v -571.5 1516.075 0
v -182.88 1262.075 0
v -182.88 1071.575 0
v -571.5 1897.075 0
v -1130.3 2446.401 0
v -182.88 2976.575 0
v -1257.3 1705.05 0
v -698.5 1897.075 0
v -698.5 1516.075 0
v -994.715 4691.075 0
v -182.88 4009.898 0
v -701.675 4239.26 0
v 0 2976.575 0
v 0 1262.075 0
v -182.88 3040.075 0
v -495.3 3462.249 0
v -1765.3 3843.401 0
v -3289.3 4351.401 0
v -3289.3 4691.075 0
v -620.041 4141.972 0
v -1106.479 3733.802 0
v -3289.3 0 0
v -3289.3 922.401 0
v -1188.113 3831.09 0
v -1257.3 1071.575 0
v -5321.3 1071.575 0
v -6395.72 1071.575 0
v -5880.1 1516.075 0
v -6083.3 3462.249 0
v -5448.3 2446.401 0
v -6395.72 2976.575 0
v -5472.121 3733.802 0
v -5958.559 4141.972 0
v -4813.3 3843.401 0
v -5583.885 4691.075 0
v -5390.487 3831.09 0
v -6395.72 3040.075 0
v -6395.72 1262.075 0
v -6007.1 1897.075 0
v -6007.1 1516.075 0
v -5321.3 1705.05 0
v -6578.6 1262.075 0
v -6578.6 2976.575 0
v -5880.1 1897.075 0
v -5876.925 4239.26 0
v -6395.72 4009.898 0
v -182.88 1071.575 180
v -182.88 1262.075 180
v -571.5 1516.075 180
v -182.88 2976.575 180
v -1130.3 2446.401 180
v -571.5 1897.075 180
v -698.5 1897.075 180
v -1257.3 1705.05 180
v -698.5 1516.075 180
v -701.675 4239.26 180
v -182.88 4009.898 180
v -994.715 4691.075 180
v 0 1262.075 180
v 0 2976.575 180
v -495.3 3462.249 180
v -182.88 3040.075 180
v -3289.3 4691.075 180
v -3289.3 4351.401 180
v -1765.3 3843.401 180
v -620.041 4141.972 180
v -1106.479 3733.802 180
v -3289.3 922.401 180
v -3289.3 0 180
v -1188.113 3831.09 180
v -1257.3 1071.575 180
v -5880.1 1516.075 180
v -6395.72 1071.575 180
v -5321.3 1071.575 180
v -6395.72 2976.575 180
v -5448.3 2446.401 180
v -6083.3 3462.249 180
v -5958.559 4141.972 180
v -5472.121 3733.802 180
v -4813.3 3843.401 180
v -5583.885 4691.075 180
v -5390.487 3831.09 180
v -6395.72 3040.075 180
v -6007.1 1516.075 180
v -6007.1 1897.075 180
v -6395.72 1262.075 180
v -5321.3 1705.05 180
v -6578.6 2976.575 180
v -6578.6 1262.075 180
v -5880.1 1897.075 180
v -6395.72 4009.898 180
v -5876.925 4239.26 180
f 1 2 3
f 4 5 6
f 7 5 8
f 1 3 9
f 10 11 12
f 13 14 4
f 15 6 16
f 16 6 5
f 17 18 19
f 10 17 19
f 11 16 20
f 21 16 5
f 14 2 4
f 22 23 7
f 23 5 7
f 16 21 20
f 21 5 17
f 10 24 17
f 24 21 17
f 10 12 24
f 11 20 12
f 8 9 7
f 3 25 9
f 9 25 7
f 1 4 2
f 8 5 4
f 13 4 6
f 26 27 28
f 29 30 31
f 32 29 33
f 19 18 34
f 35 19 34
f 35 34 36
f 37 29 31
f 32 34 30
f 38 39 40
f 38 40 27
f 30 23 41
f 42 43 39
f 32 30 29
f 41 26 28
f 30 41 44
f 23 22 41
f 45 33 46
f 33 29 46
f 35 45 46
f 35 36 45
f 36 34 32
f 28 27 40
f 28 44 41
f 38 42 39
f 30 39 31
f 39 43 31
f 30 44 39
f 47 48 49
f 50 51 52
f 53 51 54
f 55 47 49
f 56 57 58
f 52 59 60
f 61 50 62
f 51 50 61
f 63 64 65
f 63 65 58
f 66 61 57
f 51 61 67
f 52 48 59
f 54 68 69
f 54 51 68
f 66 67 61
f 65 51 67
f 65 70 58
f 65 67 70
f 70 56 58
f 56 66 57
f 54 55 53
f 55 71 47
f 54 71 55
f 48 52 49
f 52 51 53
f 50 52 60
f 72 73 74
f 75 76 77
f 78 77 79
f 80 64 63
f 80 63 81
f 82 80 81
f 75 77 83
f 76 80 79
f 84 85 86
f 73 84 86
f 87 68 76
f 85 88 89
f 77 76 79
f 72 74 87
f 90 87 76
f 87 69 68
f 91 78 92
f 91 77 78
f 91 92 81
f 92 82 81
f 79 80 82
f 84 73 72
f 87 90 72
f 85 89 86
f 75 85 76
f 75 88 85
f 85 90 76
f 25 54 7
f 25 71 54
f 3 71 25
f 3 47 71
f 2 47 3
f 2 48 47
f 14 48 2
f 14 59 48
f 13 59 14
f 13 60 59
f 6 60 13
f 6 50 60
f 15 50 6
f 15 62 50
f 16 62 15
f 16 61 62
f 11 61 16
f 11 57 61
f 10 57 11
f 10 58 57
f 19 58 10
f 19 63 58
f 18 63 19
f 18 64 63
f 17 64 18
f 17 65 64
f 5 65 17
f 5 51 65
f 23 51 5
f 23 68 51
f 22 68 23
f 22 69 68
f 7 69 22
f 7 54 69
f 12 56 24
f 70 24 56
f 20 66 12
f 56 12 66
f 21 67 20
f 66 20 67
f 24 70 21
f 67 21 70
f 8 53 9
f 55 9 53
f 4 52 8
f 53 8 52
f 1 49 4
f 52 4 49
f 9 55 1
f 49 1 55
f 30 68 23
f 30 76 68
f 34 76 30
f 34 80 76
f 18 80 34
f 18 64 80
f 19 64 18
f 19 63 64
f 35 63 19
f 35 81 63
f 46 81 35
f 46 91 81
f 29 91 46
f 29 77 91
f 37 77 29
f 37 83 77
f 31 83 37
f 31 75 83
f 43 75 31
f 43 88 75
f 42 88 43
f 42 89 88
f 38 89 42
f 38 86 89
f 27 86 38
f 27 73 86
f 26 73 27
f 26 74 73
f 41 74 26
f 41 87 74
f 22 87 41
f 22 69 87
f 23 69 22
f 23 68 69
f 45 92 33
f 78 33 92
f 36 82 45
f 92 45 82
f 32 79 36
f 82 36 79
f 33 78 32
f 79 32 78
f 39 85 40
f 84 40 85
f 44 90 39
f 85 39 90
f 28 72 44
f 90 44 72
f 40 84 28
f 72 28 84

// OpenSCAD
// file: global_constants.scad
// unit = 0.1 mm
// 1 inch = 25.4 mm = 254 units

// Dimensions

// Sheet dimensions
sheet_x=24400;
sheet_y=12200;
sheet_z=180;

// Circular cnc routing holes
cnc_circle_r=31.750;
module routing_circle(x,y){
  translate([x,y]) linear_extrude(height=sheet_z) circle(cnc_circle_r);
}

bolt_circle_r=41.0210;
module bolt_circle(x,y){
  translate([x,y]) linear_extrude(height=sheet_z) circle(bolt_circle_r);
}

// Conversion
medievaltometric=254;
metrictomedieval=.0039370078;

// Use the metric system by default
// units="medieval";
units="metric";

// Light plate construction
light_plate_support_height=1651;//6.5"
light_plate_support_width=3662.68;//14.42

// Base construction
large_support_depth=3667.4552;//14.4388"
large_support_height=4254.5;//16.75"
small_support_depth=1460.5;
small_support_height=4254.5;
front_brace_width=5842+2*sheet_z;
base_brace_edge_depth=53;

// Cradle construction
cradle_base_full_width=5969;//23.5"
cradle_base_front_corner_depth=538.3784;//2.1196"

cradle_lift_arm_cutout_height=63.5;//.25"
// main file
// To render the DXF file from the command line:
// openscad -x back_plate.dxf -D'units="metric"' back_plate.scad

include <global_constants.scad>;

main_rectangle_x=12.95*254;
main_rectangle_y=18.4688*254;

corner_rectangle_y=14.25*254;
corner_rectangle_x=4.95*254;
corner_rectangle_rectangular_cutout_x=0.72*254;
corner_rectangle_bottom_rectangular_cutout_y=0.75*254;
corner_rectangle_top_rectangular_cutout_y=6.75*254;

top_corner_height=6.75*254;

//base shape for half of the top plate
module main_trapezium(){
  difference(){
    square([main_rectangle_x,main_rectangle_y]);
    translate([main_rectangle_x,0,0]) rotate(50) translate([-main_rectangle_x,0,0]) square([main_rectangle_x,main_rectangle_y]);
  }
}

module top_corner_cutout(){
  polygon([[0,0],[corner_rectangle_rectangular_cutout_x,0],[corner_rectangle_rectangular_cutout_x,cnc_circle_r*2],[1.95*254,1.9121*254],[corner_rectangle_rectangular_cutout_x,4.0682*254],[3.9162*254,top_corner_height],[0,top_corner_height],[0,0]]);
}

//rectangular overlay on the outside of the trapezium
module corner_rectangle(){
  difference() {
    square([corner_rectangle_x,corner_rectangle_y]);
    square([corner_rectangle_rectangular_cutout_x,corner_rectangle_bottom_rectangular_cutout_y]);
    //hole for small brace between front and back plate
    translate([2.25*254,1.75*254,0]) square([0.5*254,1.5*254]);
  }
}

module back_plate_half(){
  difference(){
    union(){
      main_trapezium();
      translate([0,main_rectangle_y-corner_rectangle_y,0]) corner_rectangle();
    }
    translate([0,main_rectangle_y-corner_rectangle_top_rectangular_cutout_y,0]) square([corner_rectangle_rectangular_cutout_x,corner_rectangle_top_rectangular_cutout_y]);
    //top corner cutout (fixed size)
    translate([0,main_rectangle_y-top_corner_height,0]) top_corner_cutout();
    //big hole (fixed size)
    translate([main_rectangle_x,3.6315*254,0]) polygon([[0,0],[-8.5*254,6*254],[-6*254,11.5*254],[0,13.5*254]]);
    //hole for large brace between front and back plate
    translate([2.7625*254,main_rectangle_y-1.7788*254,0]) rotate(230) square([0.5*254,2.5*254]);

  }
}

//mirrored back plate half
module back_plate_full(){
  union(){
    back_plate_half();
    translate([main_rectangle_x*2,0,0]) mirror([1,0,0]) back_plate_half();
  }
}

linear_extrude(sheet_z) mirror([1,0,0]) back_plate_full();
